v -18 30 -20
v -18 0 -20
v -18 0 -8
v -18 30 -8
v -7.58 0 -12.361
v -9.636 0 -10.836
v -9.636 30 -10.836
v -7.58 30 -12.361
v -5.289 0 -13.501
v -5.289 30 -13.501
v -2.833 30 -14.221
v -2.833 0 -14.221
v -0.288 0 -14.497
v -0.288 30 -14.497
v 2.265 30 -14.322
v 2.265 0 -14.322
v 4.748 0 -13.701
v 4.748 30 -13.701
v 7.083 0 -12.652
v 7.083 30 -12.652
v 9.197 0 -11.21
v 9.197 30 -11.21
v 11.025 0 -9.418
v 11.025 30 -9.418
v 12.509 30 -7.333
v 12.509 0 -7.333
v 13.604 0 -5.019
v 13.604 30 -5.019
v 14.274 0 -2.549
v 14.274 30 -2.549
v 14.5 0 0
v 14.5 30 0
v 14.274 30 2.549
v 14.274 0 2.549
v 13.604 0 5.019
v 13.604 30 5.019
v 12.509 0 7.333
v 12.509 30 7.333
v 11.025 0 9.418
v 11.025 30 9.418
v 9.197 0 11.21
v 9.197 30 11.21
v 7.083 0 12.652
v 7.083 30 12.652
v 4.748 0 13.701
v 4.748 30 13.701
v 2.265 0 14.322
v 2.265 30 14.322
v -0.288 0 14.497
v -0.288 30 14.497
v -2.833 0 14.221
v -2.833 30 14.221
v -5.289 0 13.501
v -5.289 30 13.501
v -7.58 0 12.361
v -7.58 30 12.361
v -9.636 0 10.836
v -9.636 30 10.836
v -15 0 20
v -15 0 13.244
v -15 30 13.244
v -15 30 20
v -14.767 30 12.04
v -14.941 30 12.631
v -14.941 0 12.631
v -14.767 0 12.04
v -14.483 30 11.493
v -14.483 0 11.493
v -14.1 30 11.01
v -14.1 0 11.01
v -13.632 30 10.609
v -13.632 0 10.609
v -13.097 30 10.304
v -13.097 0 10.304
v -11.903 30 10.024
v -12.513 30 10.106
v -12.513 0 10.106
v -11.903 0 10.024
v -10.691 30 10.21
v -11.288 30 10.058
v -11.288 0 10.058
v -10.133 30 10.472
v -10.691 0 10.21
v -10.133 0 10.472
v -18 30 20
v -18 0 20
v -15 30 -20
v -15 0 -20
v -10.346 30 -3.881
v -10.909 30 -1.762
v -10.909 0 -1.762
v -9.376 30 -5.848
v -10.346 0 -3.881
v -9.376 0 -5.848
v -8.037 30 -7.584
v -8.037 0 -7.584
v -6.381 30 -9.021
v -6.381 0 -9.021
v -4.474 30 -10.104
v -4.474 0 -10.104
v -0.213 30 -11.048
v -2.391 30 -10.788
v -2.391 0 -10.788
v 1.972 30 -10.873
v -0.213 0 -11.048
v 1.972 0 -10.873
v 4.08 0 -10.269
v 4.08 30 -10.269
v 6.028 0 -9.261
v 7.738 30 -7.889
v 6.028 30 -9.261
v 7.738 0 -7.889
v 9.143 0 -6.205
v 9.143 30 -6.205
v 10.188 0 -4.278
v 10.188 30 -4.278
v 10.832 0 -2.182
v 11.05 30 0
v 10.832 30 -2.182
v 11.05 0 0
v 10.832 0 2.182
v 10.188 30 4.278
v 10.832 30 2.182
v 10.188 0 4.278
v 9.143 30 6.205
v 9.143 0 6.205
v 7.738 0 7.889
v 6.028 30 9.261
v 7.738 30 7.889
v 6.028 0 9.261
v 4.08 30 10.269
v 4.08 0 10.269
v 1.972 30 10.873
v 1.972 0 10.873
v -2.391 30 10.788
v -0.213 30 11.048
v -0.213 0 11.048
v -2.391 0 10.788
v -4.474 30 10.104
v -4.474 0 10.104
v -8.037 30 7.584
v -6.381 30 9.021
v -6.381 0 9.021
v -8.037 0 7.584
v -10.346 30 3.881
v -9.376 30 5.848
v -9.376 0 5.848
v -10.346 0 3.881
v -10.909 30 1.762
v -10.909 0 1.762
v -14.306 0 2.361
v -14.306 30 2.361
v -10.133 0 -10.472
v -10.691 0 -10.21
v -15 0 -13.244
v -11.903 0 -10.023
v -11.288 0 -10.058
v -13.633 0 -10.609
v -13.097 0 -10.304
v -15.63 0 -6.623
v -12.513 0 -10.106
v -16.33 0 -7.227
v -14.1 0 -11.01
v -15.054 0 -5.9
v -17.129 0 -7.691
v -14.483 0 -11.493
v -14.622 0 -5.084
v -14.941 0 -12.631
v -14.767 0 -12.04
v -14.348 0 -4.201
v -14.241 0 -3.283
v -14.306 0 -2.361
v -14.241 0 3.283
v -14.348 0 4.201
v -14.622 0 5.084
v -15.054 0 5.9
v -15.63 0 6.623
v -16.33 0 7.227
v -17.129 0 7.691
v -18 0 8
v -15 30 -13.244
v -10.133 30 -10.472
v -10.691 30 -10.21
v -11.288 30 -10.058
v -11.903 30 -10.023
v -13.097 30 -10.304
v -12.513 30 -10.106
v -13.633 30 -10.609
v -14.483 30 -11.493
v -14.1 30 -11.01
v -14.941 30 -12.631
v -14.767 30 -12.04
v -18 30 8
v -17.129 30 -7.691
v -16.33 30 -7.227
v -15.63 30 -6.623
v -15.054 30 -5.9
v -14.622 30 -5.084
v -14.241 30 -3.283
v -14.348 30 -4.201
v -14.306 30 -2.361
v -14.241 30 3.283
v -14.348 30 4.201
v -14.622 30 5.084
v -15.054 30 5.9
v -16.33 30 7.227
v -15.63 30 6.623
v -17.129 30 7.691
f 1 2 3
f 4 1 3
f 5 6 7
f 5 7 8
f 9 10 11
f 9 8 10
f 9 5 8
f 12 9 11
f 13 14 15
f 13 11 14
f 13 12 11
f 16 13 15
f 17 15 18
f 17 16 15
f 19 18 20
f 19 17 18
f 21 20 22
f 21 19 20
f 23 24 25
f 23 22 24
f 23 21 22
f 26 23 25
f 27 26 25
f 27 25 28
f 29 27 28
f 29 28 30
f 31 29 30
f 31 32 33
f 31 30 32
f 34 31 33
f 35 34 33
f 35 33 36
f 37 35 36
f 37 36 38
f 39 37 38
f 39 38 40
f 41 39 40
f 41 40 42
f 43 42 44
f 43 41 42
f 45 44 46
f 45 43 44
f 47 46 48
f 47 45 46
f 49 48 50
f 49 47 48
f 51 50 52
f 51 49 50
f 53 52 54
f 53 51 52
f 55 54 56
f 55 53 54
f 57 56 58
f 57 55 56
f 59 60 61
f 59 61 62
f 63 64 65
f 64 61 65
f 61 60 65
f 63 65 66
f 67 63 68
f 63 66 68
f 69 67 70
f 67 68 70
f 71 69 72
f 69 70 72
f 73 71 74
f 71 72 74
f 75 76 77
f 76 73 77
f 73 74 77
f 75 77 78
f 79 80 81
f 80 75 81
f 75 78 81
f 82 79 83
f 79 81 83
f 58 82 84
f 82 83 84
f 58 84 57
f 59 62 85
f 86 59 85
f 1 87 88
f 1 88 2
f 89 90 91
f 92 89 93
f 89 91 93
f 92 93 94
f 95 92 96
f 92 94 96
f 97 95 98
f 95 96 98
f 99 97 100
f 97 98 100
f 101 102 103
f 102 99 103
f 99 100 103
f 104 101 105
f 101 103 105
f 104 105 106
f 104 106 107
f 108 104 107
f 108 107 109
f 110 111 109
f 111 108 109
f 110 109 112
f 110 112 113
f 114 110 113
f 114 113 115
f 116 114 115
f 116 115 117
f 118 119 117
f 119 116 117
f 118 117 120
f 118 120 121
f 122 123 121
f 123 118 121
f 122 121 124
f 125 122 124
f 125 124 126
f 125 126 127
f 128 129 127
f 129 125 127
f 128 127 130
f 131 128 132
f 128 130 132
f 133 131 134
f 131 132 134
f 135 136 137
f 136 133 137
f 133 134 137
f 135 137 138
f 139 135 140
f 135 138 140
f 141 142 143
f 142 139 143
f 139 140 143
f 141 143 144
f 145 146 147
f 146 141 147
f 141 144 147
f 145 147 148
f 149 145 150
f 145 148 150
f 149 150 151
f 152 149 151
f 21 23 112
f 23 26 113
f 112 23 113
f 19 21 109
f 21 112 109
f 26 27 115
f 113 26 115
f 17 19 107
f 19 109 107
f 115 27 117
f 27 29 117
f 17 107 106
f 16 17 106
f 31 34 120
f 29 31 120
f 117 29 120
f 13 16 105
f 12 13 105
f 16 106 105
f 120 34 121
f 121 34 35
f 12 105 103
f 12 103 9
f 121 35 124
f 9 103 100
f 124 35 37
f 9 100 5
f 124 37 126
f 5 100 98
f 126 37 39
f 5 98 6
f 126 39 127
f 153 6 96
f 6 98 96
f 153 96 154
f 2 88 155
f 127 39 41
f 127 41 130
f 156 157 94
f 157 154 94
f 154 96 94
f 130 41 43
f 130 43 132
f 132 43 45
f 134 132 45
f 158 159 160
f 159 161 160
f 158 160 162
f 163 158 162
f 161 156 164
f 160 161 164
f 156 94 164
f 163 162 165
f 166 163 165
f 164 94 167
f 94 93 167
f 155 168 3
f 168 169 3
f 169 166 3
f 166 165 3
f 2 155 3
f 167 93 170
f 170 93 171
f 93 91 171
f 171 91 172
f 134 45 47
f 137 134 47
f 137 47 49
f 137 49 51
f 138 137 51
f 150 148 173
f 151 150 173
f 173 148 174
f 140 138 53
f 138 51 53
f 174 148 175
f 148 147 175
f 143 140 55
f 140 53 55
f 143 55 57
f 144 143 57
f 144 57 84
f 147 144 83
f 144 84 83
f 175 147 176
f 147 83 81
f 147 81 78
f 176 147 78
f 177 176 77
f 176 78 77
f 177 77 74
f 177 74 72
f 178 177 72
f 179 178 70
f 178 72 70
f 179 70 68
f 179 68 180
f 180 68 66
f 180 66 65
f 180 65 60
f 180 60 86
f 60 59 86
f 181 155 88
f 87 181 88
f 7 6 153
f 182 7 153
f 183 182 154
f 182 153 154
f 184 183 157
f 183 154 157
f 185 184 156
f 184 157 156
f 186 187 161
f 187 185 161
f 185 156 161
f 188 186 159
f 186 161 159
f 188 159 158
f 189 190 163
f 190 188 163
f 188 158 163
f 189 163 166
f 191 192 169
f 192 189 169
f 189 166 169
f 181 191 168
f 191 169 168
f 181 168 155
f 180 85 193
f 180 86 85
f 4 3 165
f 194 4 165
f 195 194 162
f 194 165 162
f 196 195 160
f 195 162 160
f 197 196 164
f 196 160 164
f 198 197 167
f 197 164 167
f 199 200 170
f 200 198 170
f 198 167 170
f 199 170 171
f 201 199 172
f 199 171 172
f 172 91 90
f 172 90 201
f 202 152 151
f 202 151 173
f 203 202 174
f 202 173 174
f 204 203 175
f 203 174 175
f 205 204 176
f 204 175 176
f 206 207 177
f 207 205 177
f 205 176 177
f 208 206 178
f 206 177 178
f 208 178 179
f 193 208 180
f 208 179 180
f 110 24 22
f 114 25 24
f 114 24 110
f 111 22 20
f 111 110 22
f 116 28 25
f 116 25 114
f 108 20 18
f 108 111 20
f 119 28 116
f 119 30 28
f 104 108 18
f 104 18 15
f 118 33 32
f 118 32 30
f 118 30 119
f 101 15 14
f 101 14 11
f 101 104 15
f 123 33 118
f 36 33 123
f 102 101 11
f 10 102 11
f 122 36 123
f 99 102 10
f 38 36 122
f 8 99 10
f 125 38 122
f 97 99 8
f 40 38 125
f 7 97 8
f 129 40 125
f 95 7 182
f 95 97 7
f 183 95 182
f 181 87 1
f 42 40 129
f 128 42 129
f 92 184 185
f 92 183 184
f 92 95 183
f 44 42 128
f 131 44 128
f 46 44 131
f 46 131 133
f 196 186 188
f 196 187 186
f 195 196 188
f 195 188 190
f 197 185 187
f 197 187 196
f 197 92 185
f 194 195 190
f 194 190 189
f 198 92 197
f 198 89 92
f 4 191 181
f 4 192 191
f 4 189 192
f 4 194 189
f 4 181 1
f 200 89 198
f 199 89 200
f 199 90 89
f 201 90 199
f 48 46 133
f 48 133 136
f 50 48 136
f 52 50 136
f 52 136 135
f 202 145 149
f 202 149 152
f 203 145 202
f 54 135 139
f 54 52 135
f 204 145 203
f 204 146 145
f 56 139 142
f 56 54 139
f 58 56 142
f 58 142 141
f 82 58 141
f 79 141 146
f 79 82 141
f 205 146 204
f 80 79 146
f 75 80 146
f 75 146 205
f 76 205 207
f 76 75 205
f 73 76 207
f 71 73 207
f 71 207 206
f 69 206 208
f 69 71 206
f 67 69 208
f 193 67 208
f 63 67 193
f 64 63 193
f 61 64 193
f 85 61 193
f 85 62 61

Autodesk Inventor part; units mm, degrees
ref_plane "YZ Plane" through (0, 0, 0) normal (1, 0, 0) x (0, 1, 0)
ref_plane "XZ Plane" through (0, 0, 0) normal (0, 1, 0) x (-1, 0, 0)
ref_plane "XY Plane" through (0, 0, 0) normal (0, 0, 1) x (1, 0, 0)
sketch "Sketch1" plane through (0, 0, 0) normal (0, 1, 0) x (-1, 0, 0)
  arc A0 (10.9086, 1.7618) -> (10.9086, -1.7618) centre (0, 0) ccw
  arc A1 (14.3065, 2.361) -> (14.3065, -2.361) centre (0, 0) ccw
  line L0 (15, 13.2439) -> (15, 20)
  line L1 (15, 20) -> (18, 20)
  line L2 (18, 20) -> (18, 8)
  line L3 (15, -13.2439) -> (15, -20)
  line L4 (15, -20) -> (18, -20)
  line L5 (18, -20) -> (18, -8)
  arc A2 (9.6355, 10.8355) -> (15, 13.2439) centre (11.7771, 13.2439) ccw
  arc A3 (15, -13.2439) -> (9.6355, -10.8355) centre (11.7771, -13.2439) ccw
  line L6 (10.9086, -1.7618) -> (14.3065, -2.361)
  line L7 (10.9086, 1.7618) -> (14.3065, 2.361)
  line L8 (17.4762, 0) -> (-4.0395, 0) construction
  arc A4 (18, 8) -> (14.3065, 2.361) centre (19.2199, 3.1718) ccw
  arc A5 (14.3065, -2.361) -> (18, -8) centre (19.2199, -3.1718) ccw
  dimension "d0" = 22.1
  dimension "d1" = 29
  dimension "d2" = 12
  dimension "d3" = 12
  dimension "d4" = 3
  dimension "d5" = 3
  dimension "d8" = 15
  dimension "d10" = 10
  dimension "d11" = 10
  dimension "d12" = 3.5237
  dimension "d13" = 1.7618
  dimension "d14" = 20
  dimension "d15" = 20
extrude "Extrusion1" add sketch "Sketch1" along normal blind 30
equation "\"d3\" = d2"
equation "\"d11\" = d10"
equation "\"d13\" = 0.5 * d12"
properties part number "motor_holder" material "ABS Plastic"
